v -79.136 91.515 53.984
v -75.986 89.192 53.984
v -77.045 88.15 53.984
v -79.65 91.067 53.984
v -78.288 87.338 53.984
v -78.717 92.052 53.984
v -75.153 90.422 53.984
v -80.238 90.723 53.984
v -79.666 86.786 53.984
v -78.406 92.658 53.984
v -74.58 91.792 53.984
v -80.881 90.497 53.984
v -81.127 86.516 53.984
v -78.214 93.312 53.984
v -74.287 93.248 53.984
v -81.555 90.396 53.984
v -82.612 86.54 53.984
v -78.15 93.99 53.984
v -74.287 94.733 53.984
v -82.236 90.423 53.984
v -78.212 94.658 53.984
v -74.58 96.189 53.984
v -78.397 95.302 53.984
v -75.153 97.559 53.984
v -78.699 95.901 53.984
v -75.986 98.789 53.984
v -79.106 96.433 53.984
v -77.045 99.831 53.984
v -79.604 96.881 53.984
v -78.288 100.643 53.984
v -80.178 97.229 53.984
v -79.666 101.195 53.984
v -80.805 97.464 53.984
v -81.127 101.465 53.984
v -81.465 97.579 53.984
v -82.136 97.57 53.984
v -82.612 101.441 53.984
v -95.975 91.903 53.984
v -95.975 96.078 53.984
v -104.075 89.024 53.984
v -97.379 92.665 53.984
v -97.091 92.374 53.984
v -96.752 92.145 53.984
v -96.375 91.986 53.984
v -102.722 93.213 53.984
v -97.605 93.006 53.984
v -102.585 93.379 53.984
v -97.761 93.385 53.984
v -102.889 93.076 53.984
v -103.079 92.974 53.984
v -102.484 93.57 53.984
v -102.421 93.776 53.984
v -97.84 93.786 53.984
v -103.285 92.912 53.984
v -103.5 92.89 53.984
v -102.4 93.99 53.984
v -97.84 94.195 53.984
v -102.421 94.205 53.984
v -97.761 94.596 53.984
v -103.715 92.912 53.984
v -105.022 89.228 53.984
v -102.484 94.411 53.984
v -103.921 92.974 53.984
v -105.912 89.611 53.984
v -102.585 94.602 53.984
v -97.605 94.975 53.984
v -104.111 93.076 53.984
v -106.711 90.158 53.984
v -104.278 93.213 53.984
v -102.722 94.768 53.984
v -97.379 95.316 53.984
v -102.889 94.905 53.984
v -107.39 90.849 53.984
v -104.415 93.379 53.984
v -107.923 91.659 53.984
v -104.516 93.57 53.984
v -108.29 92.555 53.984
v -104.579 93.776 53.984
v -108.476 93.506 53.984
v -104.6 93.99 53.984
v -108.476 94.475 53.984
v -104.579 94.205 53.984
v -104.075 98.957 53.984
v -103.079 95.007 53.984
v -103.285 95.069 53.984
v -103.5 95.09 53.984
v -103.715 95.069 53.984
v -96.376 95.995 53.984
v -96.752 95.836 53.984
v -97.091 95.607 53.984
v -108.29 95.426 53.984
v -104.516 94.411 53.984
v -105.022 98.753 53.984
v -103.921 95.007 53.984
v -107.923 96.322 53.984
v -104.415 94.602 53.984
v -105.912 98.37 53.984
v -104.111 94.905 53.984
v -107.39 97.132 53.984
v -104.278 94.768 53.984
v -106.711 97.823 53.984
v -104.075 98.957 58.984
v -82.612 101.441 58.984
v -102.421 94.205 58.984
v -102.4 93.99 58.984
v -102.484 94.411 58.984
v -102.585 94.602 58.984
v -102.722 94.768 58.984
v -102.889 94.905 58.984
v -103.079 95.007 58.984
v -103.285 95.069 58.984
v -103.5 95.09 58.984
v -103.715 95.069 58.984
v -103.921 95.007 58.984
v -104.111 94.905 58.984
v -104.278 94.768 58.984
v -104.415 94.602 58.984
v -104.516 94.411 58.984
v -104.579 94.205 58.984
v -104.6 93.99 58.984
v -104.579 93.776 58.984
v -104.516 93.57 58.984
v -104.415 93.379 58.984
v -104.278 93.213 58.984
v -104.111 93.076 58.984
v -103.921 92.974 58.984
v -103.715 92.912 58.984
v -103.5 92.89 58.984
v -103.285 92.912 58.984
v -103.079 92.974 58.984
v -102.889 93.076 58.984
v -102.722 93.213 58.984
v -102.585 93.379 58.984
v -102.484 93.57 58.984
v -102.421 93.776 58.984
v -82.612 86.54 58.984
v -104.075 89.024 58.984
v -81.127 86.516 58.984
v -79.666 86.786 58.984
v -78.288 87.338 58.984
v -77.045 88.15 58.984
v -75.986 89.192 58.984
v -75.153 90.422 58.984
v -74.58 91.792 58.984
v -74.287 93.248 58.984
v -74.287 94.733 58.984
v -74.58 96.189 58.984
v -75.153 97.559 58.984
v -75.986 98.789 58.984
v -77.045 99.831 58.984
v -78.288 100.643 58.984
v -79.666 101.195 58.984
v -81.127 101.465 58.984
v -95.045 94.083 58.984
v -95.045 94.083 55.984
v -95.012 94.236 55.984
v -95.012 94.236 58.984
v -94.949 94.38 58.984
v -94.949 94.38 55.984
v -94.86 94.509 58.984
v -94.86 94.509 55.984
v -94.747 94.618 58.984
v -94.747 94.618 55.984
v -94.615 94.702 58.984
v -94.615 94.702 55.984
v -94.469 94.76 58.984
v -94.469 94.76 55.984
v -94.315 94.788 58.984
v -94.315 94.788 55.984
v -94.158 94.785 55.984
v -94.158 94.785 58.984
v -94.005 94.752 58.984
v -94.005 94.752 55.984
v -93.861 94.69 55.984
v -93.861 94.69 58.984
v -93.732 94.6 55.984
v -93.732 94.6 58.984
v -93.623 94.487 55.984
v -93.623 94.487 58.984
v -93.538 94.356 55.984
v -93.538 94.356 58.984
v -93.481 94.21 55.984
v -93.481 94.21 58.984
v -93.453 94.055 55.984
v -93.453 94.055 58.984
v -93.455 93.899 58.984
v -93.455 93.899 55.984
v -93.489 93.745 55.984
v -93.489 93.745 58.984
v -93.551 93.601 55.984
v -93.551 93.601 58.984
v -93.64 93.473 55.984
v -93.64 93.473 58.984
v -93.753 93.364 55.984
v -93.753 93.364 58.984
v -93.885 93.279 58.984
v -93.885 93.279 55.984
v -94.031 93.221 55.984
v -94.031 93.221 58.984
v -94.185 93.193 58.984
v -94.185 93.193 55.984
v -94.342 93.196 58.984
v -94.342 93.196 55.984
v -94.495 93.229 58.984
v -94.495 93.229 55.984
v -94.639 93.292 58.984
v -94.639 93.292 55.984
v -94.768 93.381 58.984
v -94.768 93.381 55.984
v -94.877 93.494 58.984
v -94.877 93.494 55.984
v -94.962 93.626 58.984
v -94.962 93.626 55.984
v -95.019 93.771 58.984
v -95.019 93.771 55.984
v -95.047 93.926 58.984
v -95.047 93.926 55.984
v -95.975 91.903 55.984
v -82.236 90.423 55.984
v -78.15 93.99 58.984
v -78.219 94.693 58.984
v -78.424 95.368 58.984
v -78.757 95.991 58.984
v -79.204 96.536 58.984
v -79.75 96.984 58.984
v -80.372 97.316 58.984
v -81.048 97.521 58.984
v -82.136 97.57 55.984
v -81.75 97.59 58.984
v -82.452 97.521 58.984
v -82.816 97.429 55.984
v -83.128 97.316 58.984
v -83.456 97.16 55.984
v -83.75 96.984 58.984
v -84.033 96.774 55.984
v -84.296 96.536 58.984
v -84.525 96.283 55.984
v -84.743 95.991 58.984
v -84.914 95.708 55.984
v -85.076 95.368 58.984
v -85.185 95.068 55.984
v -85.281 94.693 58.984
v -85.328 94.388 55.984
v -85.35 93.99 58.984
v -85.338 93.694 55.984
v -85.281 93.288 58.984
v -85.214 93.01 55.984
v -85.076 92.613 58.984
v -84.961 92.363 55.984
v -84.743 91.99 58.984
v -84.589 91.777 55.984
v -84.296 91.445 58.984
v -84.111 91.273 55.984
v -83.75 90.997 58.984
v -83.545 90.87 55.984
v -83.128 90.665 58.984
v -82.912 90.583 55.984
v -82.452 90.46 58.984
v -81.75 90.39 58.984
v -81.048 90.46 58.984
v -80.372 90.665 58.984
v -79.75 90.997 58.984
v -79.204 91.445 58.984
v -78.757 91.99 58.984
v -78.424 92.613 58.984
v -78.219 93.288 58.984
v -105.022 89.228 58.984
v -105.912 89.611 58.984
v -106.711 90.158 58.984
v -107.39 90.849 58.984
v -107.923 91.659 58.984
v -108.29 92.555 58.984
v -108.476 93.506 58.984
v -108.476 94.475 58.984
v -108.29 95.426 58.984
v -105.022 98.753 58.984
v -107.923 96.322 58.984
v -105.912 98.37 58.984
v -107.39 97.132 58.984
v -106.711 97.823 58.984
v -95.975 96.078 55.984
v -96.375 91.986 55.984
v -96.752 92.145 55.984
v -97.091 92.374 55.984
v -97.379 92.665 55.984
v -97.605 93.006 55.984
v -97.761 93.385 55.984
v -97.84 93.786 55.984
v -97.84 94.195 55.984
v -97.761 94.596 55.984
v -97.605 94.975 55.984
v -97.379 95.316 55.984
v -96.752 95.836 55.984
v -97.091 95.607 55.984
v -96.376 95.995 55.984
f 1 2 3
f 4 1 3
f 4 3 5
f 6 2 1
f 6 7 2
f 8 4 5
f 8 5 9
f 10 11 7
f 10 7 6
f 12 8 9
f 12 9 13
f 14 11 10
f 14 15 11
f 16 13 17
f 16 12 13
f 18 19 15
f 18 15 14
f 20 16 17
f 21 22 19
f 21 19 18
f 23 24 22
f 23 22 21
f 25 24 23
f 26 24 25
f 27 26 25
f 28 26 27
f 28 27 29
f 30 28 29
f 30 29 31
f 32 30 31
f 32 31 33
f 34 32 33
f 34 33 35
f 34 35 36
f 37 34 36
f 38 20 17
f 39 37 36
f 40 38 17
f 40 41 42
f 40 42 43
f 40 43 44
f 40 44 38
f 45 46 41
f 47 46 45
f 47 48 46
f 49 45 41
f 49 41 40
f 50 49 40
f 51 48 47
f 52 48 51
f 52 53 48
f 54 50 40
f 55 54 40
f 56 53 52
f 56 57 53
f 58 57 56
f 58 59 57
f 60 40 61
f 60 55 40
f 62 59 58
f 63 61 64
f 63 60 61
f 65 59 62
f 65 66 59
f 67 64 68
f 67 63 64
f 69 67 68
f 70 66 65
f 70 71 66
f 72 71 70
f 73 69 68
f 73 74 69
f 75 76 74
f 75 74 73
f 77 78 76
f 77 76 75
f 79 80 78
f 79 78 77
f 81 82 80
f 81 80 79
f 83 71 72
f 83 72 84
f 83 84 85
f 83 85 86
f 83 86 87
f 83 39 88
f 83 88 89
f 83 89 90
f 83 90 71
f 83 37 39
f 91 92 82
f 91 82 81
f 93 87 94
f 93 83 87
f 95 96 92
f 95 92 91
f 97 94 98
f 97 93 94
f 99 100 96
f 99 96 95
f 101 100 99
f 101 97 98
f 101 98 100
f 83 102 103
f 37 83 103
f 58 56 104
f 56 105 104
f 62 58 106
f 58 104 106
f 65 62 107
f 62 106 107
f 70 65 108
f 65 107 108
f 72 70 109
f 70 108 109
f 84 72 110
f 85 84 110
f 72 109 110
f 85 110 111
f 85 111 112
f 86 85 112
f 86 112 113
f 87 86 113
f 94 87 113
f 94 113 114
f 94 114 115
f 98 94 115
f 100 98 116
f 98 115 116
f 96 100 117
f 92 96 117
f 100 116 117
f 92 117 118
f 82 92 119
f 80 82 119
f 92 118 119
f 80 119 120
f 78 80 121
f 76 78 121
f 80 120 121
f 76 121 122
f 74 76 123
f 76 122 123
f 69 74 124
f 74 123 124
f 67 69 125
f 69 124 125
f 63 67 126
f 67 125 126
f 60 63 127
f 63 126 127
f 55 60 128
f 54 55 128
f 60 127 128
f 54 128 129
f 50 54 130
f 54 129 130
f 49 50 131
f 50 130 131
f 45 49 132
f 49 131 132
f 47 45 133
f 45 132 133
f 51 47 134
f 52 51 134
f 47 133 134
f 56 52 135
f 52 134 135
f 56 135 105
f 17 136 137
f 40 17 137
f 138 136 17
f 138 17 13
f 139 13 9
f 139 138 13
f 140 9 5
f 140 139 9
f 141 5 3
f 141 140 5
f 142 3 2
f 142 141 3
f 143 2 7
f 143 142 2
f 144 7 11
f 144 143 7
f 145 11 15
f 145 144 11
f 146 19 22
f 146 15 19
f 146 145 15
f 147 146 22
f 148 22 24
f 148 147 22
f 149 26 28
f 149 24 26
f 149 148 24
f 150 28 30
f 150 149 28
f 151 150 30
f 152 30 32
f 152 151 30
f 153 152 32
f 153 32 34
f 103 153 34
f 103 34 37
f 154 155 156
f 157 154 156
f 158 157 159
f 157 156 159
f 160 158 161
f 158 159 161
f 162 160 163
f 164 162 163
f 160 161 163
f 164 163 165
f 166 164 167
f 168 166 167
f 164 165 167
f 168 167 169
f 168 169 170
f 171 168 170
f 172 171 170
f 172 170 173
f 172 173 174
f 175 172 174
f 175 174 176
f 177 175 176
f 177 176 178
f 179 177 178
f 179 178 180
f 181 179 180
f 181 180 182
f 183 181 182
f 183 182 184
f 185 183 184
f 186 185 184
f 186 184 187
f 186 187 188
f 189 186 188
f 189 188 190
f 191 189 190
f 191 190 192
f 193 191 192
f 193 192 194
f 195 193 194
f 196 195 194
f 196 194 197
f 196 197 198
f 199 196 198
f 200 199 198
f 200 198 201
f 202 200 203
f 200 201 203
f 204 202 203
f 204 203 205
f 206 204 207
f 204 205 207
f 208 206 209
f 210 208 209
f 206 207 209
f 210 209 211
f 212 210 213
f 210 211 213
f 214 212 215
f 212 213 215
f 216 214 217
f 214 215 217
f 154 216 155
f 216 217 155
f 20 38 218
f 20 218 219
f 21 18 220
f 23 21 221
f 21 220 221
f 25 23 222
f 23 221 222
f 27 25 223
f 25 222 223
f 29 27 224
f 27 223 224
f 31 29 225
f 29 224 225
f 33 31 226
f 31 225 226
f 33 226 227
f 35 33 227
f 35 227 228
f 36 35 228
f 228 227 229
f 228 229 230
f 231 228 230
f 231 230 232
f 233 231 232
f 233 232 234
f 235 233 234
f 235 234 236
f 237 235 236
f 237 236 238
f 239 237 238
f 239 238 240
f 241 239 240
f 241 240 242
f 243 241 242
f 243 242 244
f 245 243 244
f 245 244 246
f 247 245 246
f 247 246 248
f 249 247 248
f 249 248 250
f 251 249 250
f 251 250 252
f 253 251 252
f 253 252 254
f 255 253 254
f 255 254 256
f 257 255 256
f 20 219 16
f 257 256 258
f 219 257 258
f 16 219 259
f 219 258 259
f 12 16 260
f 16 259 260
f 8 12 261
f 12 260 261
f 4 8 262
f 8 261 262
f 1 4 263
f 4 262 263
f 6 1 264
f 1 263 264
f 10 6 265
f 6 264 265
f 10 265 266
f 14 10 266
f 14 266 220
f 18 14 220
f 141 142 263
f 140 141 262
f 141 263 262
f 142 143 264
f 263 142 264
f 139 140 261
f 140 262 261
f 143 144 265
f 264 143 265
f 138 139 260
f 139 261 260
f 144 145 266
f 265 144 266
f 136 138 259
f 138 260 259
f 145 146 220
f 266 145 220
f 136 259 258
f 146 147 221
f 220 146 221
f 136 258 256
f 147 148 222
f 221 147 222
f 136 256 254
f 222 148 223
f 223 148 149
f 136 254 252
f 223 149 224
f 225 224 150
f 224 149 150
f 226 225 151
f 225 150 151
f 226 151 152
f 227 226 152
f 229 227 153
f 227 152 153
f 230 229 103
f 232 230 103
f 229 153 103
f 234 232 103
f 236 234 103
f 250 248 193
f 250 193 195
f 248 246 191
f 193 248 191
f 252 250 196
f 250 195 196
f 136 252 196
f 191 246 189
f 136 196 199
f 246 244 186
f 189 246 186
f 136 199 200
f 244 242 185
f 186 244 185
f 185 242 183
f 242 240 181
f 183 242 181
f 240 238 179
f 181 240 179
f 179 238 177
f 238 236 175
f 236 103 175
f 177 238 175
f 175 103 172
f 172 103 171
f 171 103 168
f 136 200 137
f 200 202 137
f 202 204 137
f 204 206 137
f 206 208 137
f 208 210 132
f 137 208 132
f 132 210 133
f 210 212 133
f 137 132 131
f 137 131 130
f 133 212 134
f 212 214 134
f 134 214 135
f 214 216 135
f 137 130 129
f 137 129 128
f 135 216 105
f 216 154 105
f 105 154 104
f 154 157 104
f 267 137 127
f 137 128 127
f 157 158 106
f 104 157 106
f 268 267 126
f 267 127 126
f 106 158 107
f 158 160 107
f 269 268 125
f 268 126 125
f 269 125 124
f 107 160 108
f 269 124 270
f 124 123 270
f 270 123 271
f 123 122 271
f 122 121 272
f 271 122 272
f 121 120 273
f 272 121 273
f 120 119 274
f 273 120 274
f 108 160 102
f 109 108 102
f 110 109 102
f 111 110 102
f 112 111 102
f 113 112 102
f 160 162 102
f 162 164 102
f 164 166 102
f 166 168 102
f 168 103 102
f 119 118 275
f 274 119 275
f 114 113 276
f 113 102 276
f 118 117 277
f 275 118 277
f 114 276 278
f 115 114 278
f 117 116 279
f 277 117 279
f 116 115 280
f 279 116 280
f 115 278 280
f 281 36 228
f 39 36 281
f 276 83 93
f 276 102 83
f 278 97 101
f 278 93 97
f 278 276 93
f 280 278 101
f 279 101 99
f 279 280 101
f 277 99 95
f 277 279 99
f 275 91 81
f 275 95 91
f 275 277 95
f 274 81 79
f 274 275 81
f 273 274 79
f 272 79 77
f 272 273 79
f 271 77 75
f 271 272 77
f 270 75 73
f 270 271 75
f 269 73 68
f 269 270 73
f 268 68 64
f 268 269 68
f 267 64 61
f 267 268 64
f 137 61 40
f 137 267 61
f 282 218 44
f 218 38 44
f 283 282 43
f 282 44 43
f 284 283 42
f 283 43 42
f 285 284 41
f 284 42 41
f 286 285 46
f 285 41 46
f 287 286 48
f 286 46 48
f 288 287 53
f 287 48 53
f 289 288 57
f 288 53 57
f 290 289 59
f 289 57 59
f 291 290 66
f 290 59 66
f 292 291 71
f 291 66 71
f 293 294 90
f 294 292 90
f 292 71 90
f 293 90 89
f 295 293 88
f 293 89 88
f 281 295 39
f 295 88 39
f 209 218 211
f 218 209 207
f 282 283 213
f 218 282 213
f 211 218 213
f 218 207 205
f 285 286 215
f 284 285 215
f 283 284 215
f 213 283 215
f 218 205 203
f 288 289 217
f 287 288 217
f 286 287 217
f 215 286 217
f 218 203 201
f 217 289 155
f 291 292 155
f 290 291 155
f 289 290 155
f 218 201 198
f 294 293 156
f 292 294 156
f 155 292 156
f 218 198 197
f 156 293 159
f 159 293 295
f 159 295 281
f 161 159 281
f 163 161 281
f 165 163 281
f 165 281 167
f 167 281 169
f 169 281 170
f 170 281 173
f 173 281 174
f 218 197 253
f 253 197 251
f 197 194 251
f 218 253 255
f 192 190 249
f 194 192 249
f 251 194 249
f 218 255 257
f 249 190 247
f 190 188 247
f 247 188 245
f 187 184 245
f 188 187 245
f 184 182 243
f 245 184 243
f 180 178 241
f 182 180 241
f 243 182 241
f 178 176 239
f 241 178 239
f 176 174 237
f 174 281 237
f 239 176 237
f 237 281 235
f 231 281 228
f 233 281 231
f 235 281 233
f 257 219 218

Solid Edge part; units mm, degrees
sketch "Sketch1" plane through (0, 0, 58.9841) normal (0, 0, 1) x (1, 0, 0)
  arc A0 (-104.0747, 89.0237) -> (-104.0747, 98.9574) centre (-103.5, 93.9905) cw
  line L0 (-104.0747, 98.9574) -> (-82.6121, 101.4408)
  arc A1 (-82.6121, 101.4408) -> (-82.6121, 86.5402) centre (-81.75, 93.9905) cw
  line L1 (-82.6121, 86.5402) -> (-104.0747, 89.0237)
  circle A2 centre (-81.75, 93.9905) radius 3.6
  circle A3 centre (-103.5, 93.9905) radius 1.1
extrude "Protrusion1" add sketch "Sketch1" against normal blind 5
sketch "Sketch2" plane through (-91.375, 93.9905, 53.9841) normal (0, 0, -1) x (-0.9933721, 0.1149425, 0)
  circle A0 centre (2.856, -0.3304) radius 0.8
extrude "Cutout1" cut sketch "Sketch2" against normal through all
sketch "Sketch3" plane through (-91.375, 93.9905, 53.9841) normal (0, 0, -1) x (-0.9933721, 0.1149425, 0)
  line L0 (-8.7667, 4.6175) -> (4.8095, 1.5454)
  arc A0 (4.8095, 1.5454) -> (4.3293, -2.6027) centre (4.346, -0.5028) cw
  line L1 (4.3293, -2.6027) -> (-9.4884, -2.4929)
  arc A1 (-9.4884, -2.4929) -> (-8.7667, 4.6175) centre (-9.5612, 1.1063) cw
extrude "Cutout2" cut sketch "Sketch3" against normal blind 2
